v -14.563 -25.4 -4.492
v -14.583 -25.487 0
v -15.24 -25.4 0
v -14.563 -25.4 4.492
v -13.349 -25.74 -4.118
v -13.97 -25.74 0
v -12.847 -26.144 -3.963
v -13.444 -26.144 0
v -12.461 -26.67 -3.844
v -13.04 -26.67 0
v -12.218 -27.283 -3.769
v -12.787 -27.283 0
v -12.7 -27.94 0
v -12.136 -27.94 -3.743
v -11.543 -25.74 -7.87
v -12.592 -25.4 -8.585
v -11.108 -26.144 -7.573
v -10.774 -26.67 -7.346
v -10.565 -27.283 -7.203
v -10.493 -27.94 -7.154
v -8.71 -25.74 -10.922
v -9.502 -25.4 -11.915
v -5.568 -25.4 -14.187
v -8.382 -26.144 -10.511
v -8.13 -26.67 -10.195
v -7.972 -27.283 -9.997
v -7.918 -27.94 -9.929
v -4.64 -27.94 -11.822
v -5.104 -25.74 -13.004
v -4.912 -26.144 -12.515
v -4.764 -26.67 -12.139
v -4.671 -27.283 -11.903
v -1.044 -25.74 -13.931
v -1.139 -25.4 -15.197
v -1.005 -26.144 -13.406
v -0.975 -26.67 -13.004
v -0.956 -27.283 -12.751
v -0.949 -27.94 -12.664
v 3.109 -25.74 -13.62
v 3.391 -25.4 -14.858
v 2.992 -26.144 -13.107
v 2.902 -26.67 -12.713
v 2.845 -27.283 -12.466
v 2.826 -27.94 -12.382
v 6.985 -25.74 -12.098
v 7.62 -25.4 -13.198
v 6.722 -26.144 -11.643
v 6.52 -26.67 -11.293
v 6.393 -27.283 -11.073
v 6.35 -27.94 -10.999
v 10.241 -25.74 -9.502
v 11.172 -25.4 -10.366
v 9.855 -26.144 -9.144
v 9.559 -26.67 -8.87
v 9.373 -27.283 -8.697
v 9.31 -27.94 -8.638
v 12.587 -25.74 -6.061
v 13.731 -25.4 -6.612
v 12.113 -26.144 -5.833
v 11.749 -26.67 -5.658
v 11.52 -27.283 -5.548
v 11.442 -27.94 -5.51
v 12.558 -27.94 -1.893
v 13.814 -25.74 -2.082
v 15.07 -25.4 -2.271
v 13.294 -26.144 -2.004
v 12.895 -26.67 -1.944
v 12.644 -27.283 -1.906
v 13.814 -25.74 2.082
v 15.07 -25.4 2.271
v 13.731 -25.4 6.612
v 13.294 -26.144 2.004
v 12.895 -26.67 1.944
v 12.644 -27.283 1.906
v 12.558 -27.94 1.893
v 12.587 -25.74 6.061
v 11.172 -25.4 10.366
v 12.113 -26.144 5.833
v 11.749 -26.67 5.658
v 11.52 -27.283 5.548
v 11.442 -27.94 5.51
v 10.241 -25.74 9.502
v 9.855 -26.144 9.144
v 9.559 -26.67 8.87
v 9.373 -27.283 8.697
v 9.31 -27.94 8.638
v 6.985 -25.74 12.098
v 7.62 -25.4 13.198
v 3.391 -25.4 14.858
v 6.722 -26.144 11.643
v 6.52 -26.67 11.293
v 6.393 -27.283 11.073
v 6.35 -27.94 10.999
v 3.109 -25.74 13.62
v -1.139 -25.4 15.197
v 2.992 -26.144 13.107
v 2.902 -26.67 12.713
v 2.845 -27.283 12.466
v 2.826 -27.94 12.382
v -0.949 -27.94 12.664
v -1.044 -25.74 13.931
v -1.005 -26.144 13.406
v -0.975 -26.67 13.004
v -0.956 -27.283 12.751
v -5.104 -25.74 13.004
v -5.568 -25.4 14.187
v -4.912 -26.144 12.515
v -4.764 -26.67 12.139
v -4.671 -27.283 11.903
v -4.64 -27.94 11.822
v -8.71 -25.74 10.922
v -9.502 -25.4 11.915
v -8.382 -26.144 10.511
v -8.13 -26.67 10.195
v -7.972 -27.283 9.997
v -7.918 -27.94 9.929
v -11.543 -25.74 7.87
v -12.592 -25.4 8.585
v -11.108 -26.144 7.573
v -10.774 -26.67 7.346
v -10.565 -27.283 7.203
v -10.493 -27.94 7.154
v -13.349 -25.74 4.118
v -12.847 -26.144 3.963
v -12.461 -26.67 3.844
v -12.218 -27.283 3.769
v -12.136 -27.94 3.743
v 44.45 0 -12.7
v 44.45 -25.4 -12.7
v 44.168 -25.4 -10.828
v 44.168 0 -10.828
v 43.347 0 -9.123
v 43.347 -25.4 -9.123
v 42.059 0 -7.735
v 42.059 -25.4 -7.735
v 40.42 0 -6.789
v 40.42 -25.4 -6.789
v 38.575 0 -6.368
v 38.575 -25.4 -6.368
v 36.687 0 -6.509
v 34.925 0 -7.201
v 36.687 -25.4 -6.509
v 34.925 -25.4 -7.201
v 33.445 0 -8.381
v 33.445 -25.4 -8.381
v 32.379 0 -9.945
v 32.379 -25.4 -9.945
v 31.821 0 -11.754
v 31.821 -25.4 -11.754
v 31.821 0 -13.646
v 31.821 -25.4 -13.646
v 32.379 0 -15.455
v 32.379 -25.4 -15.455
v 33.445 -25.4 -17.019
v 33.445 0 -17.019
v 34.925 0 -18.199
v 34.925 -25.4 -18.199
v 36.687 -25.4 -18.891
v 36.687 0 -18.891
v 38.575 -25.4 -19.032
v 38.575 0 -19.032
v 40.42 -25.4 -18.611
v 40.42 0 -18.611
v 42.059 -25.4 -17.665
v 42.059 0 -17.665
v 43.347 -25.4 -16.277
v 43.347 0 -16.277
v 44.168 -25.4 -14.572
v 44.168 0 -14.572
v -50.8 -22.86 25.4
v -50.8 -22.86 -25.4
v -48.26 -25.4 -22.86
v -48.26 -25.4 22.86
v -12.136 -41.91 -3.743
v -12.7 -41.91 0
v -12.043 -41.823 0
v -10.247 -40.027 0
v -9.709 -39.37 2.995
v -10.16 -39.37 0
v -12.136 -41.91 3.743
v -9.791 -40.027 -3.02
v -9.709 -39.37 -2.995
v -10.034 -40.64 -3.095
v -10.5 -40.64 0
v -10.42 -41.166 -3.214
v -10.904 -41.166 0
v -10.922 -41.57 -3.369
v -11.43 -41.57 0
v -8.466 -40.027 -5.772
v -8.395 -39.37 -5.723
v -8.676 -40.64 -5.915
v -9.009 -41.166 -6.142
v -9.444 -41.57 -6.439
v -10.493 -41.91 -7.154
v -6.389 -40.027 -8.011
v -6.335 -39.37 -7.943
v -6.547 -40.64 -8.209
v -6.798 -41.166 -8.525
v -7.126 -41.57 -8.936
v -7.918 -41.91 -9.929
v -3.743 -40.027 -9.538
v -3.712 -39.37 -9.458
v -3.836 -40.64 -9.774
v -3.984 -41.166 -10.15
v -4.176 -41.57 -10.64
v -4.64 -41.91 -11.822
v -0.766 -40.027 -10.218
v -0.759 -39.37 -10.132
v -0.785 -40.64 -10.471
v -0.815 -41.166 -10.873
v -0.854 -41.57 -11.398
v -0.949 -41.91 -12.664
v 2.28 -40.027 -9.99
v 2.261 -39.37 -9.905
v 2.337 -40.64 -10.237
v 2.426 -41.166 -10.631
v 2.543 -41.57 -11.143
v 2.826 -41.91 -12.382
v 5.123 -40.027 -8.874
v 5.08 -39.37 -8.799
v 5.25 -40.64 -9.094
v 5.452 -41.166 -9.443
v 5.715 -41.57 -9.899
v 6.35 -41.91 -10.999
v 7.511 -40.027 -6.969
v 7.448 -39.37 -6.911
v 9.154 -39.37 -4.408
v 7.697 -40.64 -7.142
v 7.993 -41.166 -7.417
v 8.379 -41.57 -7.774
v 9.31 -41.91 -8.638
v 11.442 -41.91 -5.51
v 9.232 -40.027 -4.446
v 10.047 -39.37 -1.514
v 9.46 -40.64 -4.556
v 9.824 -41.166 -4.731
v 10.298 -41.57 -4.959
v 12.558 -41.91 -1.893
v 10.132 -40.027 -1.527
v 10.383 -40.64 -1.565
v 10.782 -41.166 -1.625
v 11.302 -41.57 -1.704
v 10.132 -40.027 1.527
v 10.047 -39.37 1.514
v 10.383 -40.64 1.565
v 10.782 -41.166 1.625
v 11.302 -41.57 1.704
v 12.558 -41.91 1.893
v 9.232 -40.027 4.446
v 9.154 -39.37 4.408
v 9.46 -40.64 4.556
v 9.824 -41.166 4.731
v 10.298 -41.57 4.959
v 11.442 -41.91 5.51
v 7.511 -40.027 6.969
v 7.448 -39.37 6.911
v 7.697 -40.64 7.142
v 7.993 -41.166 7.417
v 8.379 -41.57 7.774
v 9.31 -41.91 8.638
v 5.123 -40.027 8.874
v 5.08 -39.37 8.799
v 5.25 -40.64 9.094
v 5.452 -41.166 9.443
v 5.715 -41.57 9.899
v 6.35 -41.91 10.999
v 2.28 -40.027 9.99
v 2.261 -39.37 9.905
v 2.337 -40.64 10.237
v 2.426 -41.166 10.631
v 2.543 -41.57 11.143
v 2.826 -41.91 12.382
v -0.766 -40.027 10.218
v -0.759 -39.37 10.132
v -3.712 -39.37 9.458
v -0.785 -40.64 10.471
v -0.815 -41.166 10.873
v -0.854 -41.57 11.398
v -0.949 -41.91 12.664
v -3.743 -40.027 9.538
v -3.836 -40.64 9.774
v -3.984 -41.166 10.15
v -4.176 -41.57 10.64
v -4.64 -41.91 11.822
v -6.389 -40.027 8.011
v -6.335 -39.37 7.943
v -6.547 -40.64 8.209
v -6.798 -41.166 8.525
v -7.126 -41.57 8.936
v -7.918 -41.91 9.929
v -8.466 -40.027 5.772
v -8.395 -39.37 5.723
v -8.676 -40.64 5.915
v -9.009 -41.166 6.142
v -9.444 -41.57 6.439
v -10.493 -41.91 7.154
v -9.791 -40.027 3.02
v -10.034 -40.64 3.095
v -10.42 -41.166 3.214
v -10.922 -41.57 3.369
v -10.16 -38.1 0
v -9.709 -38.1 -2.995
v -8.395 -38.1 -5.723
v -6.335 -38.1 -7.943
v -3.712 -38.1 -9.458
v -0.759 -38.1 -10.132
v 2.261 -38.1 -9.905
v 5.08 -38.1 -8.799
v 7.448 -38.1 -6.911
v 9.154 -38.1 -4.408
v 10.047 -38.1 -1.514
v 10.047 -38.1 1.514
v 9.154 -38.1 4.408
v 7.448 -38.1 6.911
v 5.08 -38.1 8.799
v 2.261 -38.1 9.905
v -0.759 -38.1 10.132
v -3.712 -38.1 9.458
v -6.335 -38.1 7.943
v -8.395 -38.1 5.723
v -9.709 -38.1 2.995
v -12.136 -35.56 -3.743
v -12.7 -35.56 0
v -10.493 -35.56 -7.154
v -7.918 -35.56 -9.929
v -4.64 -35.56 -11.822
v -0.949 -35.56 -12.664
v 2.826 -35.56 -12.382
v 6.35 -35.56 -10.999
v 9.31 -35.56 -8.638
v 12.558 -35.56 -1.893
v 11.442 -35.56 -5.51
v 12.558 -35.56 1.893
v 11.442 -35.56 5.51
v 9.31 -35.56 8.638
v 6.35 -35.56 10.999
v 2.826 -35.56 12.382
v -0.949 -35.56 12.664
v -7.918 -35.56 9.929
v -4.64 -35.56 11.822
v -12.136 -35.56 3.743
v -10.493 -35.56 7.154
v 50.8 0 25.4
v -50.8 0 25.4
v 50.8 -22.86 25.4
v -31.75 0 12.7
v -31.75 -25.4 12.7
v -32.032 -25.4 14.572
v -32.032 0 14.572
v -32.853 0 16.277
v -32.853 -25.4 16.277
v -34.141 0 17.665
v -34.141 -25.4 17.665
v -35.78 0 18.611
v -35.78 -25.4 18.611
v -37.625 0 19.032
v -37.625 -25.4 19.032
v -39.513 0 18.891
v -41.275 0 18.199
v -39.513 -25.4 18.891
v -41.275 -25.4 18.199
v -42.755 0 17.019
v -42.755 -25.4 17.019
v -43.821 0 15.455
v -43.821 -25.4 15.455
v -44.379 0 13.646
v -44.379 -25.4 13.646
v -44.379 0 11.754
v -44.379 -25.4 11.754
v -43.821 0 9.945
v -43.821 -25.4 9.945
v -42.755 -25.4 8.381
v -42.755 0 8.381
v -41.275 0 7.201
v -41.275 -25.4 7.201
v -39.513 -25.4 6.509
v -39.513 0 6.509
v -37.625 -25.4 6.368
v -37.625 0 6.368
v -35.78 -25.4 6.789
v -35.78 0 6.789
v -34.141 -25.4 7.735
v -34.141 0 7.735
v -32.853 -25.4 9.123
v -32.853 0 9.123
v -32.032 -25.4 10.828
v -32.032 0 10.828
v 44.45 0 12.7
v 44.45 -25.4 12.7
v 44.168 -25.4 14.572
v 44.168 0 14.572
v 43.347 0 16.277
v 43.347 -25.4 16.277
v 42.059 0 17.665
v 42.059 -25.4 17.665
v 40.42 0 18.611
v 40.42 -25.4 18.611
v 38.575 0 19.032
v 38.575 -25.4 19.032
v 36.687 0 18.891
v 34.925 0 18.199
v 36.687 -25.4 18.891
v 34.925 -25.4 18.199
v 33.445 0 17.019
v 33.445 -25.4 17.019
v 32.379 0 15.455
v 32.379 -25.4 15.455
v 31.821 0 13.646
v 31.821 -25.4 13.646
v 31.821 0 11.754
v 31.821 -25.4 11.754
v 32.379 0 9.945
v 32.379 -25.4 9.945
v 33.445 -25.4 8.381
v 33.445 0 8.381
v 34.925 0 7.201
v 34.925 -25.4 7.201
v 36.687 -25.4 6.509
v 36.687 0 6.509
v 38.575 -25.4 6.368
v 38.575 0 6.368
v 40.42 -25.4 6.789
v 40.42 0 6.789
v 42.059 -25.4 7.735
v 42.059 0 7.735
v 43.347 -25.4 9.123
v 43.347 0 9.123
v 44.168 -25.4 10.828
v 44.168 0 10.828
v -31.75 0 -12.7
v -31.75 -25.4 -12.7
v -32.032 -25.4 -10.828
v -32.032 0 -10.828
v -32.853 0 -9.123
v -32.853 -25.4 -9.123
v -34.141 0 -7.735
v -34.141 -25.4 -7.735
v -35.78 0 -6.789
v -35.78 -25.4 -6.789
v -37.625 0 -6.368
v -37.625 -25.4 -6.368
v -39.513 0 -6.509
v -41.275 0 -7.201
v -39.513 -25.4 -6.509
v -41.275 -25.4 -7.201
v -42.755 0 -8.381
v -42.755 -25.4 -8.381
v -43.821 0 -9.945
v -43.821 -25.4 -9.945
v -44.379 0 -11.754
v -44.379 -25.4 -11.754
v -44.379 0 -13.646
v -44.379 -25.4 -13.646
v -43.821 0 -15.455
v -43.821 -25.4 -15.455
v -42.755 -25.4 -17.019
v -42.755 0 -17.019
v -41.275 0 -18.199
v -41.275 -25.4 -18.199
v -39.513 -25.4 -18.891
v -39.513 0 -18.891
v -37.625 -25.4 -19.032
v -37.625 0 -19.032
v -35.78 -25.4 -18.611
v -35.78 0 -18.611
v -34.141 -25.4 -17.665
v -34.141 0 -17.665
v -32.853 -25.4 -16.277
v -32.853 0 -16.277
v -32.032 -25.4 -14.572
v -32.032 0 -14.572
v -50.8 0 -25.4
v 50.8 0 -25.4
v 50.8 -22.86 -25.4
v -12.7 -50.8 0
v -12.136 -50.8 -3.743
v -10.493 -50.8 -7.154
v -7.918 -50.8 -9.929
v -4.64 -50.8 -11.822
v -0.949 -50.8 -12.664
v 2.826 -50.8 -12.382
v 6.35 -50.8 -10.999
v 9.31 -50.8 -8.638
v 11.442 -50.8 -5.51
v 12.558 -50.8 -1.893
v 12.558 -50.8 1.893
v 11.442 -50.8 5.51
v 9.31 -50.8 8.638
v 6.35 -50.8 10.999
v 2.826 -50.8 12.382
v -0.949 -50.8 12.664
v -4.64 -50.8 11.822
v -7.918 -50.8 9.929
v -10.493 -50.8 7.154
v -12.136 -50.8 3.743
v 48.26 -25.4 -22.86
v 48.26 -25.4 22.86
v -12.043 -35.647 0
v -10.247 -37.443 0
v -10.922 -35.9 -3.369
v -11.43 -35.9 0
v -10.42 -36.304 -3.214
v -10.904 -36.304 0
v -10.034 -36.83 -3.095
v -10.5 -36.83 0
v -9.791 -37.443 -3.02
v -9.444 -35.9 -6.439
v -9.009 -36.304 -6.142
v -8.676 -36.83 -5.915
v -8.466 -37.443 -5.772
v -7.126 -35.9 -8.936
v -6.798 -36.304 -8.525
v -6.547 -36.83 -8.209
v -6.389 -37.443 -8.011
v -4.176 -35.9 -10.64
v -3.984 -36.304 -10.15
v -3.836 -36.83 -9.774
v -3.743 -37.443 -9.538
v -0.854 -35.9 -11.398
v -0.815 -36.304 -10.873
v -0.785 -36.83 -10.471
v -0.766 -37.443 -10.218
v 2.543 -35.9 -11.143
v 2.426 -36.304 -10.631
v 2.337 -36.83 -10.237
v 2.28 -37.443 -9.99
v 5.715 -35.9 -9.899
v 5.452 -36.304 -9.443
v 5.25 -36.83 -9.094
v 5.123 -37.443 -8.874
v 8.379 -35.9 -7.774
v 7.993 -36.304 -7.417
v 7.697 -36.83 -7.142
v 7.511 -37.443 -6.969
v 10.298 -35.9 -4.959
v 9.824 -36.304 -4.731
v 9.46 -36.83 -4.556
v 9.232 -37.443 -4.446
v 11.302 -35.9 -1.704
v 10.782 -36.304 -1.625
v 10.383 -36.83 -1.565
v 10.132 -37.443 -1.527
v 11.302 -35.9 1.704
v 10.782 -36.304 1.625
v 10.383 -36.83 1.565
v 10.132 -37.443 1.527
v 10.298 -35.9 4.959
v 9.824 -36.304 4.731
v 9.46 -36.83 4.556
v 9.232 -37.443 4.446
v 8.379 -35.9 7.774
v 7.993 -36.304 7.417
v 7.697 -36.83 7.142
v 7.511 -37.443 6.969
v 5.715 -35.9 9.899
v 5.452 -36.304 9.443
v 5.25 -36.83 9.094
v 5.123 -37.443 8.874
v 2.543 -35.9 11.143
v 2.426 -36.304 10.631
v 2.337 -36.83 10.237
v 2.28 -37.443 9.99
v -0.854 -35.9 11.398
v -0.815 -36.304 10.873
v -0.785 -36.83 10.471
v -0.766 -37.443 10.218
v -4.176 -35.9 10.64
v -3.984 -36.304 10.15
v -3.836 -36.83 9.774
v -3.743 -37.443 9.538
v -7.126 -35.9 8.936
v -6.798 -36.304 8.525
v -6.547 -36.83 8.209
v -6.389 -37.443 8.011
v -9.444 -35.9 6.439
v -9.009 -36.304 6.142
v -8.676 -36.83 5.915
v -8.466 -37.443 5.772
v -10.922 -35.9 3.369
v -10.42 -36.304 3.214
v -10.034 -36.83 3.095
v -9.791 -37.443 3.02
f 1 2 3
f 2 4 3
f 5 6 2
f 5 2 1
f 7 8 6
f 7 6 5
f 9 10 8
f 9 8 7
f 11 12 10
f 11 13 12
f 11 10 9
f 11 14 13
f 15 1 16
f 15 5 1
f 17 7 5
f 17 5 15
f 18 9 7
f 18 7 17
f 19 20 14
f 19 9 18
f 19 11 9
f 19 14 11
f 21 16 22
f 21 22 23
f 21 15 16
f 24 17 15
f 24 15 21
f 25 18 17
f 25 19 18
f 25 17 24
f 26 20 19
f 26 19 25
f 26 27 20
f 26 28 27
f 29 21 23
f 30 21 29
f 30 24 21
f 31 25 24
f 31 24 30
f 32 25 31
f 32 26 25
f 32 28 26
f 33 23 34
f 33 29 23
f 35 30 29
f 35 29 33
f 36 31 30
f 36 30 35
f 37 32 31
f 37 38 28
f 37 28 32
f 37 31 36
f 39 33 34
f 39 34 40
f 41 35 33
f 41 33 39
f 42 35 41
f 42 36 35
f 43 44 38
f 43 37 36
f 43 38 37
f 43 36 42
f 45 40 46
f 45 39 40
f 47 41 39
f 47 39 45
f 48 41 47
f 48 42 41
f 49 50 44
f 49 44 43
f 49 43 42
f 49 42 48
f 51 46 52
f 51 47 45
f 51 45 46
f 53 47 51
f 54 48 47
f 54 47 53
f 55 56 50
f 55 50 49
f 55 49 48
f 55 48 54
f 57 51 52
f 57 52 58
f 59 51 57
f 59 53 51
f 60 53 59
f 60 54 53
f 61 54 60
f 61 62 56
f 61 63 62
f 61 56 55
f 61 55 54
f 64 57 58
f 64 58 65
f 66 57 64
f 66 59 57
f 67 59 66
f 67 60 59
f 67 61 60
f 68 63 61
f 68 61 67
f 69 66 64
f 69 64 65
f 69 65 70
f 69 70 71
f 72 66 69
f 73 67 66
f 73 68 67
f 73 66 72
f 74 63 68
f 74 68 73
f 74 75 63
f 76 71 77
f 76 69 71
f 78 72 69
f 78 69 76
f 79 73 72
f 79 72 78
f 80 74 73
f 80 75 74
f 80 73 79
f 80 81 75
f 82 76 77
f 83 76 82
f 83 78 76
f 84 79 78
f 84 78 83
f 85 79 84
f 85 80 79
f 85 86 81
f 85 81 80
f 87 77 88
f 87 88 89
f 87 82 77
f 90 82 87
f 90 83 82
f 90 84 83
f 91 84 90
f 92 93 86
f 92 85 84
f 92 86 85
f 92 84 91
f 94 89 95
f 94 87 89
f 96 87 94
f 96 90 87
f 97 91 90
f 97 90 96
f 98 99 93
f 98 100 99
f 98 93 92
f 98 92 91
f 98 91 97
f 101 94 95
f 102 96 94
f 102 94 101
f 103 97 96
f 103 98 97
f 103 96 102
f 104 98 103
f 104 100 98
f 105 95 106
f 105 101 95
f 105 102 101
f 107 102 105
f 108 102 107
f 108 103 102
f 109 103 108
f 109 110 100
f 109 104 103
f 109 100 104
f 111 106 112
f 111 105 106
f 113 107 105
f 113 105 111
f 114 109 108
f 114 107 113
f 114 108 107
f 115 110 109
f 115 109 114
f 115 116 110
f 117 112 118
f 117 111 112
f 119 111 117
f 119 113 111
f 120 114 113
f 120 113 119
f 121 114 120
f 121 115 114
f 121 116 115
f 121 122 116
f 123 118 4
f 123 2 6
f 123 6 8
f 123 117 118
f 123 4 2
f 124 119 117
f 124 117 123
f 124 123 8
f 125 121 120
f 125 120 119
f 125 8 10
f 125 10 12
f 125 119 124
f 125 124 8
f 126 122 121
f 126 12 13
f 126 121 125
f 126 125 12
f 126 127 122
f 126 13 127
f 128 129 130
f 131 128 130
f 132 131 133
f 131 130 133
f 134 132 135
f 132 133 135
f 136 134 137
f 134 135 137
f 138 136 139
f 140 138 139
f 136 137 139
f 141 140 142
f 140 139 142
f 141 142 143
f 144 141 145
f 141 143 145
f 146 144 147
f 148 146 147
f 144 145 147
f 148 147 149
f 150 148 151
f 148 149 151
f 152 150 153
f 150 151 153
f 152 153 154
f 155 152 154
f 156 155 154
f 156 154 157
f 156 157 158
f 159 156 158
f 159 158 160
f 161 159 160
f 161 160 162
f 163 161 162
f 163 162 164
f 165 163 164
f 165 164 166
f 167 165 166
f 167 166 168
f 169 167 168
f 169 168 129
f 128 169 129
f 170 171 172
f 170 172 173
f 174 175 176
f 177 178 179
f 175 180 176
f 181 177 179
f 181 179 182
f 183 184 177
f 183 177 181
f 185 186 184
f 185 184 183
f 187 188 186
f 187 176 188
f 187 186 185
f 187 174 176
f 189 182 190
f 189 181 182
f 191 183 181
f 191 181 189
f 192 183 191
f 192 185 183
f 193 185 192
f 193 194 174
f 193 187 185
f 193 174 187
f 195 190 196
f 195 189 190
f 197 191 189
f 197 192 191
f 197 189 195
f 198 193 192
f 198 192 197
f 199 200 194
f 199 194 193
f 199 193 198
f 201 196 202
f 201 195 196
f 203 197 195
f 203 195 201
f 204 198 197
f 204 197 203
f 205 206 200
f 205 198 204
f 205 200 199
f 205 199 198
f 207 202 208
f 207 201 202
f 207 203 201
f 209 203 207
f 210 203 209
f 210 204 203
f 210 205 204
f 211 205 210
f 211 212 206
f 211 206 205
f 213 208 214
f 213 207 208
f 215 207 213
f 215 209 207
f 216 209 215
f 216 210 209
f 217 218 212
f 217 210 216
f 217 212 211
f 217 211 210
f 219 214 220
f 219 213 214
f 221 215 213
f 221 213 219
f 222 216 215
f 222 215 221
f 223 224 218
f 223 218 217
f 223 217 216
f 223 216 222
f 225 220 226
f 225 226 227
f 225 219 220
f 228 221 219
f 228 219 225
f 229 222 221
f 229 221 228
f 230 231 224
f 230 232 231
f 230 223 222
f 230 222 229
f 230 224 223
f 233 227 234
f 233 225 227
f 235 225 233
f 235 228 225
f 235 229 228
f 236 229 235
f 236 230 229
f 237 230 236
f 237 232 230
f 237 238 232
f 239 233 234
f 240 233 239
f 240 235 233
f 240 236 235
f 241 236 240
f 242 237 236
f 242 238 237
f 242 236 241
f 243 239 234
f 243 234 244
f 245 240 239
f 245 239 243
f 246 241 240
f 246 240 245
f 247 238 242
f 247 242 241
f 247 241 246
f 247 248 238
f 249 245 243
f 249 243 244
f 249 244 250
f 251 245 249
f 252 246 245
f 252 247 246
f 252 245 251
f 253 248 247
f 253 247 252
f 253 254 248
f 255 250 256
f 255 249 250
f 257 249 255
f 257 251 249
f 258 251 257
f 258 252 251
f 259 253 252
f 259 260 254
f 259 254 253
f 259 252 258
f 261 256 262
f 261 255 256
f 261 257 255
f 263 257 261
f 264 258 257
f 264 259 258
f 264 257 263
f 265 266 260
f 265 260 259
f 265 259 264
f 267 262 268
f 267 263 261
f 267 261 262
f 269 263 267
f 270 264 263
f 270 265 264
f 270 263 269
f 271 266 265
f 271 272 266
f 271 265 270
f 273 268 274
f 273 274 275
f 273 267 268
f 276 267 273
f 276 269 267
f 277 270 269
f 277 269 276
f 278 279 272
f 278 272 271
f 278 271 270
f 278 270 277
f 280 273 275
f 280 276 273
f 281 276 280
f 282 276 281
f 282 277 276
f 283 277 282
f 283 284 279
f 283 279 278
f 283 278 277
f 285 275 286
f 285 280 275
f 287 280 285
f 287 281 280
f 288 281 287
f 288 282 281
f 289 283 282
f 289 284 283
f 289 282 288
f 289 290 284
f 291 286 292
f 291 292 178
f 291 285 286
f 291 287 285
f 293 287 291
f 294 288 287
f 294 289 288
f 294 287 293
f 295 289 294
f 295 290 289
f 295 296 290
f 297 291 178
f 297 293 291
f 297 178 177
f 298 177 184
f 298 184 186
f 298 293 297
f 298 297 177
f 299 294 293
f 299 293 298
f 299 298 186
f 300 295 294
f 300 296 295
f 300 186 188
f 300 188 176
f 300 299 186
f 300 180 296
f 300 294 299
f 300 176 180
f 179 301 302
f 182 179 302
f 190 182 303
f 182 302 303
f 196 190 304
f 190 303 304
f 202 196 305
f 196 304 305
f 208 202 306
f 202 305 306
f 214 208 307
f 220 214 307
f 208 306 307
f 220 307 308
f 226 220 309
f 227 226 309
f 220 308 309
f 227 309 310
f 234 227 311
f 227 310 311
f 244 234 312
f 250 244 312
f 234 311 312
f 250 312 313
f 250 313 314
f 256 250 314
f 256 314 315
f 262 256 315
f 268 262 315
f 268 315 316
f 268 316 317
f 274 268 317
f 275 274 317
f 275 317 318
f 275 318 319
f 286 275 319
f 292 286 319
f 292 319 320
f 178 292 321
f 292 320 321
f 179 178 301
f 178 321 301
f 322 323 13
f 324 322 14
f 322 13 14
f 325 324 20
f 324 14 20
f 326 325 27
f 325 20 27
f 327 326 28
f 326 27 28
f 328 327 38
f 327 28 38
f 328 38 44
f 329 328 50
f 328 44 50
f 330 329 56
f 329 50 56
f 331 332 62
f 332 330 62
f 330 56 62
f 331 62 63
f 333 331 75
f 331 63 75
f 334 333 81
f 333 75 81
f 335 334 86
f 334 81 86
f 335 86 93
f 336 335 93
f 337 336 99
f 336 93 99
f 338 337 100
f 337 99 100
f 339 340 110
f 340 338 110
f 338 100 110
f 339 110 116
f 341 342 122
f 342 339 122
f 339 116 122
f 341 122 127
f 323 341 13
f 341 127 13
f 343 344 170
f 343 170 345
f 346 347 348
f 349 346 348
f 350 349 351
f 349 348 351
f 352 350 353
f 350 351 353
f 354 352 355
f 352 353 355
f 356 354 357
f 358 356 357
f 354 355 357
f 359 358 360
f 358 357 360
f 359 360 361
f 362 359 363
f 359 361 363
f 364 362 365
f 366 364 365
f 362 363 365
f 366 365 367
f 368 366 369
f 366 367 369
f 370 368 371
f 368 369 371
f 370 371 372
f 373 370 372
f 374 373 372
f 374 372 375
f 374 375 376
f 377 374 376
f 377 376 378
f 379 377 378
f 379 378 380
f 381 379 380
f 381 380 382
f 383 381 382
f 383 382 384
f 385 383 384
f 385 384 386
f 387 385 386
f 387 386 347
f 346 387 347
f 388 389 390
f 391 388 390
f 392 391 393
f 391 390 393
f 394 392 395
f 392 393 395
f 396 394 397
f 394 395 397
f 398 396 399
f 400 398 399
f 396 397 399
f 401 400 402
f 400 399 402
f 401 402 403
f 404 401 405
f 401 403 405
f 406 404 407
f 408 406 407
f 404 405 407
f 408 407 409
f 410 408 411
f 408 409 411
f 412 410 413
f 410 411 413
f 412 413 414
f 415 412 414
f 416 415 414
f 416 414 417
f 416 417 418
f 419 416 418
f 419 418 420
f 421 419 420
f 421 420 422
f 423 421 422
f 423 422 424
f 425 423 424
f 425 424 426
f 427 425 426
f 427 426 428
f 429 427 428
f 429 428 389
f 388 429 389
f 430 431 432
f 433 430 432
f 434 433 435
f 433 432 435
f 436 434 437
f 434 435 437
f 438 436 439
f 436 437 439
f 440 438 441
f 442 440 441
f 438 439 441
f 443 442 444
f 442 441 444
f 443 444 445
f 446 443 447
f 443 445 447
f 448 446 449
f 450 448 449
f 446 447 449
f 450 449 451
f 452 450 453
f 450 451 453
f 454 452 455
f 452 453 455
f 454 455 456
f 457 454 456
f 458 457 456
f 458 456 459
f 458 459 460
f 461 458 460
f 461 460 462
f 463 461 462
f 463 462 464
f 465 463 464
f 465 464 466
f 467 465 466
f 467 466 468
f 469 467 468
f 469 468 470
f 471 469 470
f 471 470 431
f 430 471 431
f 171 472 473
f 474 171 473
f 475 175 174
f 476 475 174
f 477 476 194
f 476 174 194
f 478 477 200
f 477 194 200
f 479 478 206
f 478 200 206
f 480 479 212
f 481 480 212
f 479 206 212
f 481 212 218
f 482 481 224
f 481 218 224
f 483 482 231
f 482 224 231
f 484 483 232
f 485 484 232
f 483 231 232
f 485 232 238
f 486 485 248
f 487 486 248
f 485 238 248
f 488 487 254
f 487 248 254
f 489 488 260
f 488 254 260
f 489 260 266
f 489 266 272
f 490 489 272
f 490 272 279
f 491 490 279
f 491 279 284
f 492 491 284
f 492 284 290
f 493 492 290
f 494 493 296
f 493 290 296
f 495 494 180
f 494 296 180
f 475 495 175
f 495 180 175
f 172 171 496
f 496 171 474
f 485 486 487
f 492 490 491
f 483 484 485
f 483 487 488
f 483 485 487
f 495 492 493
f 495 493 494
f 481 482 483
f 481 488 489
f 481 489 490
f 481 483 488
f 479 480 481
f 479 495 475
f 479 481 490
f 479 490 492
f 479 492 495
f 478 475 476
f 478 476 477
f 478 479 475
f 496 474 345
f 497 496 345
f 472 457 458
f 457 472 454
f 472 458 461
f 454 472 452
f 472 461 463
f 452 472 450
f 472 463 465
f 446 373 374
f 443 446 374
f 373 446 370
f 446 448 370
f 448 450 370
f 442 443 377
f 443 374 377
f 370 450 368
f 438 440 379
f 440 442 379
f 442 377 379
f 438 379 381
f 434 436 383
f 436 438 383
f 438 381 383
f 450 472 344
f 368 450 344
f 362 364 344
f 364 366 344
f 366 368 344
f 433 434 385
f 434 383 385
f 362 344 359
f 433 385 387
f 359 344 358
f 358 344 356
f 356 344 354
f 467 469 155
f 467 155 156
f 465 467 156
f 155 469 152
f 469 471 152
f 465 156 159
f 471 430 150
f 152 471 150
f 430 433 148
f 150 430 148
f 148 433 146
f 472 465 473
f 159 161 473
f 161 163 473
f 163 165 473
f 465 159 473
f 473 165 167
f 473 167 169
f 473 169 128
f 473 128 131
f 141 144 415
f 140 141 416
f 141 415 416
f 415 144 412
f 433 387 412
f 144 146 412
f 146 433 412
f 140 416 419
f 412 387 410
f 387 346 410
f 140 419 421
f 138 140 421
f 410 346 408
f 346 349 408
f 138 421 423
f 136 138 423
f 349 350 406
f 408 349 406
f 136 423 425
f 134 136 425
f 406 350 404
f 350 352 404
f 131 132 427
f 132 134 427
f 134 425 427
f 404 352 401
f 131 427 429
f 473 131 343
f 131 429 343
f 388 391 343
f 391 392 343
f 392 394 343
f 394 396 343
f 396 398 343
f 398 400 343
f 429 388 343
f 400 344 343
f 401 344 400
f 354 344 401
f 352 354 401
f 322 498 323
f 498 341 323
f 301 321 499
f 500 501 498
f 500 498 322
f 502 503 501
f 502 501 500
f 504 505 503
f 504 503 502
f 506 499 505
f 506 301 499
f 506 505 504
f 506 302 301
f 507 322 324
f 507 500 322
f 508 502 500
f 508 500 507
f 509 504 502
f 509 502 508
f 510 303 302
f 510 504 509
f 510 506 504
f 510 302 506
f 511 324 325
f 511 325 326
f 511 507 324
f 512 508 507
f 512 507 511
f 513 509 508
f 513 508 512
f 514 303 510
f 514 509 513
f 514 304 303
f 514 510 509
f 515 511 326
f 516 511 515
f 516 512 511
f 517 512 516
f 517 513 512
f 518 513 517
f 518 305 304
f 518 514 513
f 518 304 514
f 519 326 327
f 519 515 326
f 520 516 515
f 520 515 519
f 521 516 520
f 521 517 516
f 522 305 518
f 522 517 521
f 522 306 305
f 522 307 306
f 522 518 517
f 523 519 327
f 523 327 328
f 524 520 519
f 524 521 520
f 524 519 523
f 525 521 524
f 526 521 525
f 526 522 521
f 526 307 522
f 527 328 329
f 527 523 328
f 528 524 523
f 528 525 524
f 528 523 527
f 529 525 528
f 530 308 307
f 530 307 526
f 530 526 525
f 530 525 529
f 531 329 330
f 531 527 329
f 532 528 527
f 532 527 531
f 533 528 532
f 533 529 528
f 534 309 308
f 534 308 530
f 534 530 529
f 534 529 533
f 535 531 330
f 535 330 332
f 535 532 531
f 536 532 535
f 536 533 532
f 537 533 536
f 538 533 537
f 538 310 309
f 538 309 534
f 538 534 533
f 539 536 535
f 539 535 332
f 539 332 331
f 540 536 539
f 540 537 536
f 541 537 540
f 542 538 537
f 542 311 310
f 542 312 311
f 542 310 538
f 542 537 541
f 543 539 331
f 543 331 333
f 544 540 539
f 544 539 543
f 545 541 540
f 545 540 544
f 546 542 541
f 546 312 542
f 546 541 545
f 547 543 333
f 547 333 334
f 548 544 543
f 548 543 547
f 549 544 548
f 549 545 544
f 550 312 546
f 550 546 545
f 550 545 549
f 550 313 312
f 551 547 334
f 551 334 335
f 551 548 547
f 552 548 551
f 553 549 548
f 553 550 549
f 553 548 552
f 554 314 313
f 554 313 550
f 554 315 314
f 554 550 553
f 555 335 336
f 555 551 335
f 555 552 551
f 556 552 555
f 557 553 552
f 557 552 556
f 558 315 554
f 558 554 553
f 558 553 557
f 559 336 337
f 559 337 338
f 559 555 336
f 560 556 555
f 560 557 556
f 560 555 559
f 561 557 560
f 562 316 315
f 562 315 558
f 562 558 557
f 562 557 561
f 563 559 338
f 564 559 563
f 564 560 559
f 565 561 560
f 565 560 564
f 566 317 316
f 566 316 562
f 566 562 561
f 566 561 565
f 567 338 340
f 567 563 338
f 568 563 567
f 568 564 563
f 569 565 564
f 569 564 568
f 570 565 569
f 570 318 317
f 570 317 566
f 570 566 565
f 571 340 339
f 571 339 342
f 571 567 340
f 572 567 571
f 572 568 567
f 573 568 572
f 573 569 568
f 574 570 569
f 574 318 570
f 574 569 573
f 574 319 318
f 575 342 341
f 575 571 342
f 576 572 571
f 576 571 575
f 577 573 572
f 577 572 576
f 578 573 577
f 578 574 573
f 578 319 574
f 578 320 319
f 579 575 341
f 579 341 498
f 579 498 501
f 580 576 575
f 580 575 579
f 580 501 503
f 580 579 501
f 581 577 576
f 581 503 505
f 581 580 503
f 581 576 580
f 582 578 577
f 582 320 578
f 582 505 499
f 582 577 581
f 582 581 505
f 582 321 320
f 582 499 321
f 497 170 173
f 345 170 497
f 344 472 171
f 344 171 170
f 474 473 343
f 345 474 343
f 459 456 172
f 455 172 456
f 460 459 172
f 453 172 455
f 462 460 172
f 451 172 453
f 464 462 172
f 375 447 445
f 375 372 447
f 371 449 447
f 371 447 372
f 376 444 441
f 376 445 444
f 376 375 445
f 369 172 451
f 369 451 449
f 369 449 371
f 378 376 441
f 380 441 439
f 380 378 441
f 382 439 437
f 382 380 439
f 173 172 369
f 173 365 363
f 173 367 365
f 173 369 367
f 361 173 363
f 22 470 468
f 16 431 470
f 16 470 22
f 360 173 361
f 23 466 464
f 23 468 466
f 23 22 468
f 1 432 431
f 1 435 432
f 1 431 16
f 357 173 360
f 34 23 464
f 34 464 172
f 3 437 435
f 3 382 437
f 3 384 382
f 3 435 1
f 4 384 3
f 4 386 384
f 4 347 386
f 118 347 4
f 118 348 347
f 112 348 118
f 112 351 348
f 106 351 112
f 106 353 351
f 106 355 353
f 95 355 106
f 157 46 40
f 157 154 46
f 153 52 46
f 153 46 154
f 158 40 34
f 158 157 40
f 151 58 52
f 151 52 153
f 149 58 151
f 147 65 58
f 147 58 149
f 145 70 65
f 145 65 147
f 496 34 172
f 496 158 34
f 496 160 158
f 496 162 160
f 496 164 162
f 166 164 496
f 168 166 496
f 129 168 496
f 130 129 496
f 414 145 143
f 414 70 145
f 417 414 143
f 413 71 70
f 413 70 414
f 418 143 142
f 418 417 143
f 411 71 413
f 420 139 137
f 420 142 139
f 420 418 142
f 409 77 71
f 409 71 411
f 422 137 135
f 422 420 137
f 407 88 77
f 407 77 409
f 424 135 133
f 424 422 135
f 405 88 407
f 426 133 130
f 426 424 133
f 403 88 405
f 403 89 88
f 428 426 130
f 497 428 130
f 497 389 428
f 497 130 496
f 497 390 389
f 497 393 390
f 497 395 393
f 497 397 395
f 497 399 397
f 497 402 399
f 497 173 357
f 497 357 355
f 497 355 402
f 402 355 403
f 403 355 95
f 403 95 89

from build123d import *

# Parameters (mm, degrees)
F0_W     = 101.6
F0_H     = 50.8
F1_DEPTH = 25.4
F2_R     = 6.35
F3_DEPTH = 25.401
F4_W     = 12.7
F4_H     = 25.4
F6_W     = 10.16
F6_H     = 6.35
F8_R     = 2.53999
F9_SIZE  = 2.54


# Not quite as in the source:
# - a fillet or chamfer is up to 0.001 mm smaller than in the source, because OpenCascade refuses the exact size


with BuildPart() as f1:
    # F0 (on Front) → F1 (new body)
    with BuildSketch(Plane.XZ):
        Rectangle(F0_W, F0_H)
    extrude(amount=F1_DEPTH)

    # F2 (on face) → F3 (cut, through all)
    with BuildSketch(Plane.XZ.offset(25.4)):
        with Locations((-38.1, 12.7)):
            Circle(F2_R)
        with Locations((-38.1, -12.7)):
            Circle(F2_R)
        with Locations((38.1, 12.7)):
            Circle(F2_R)
        with Locations((38.1, -12.7)):
            Circle(F2_R)
    extrude(amount=-F3_DEPTH, mode=Mode.SUBTRACT)

    # F4 (on Top) → F5 (revolve)
    with BuildSketch(Plane.XY):
        with Locations((-6.35, -38.1)):
            Rectangle(F4_W, F4_H)
    revolve(axis=Axis((0, -38.1, 0), (0, -1, 0)))

    # F6 (on Top) → F7 (revolve, cut)
    with BuildSketch(Plane.XY):
        with Locations((-15.24, -38.735)):
            Rectangle(F6_W, F6_H)
    revolve(axis=Axis((0, -57.4092715979, 0), (0, -1, 0)), mode=Mode.SUBTRACT)

    # F8 (radius 2.54 in the source; OpenCascade refuses exactly that, so slightly less here)
    f8_edges = [f1.edges().sort_by_distance(p)[0] for p in [
        (12.7, -25.4, 0),
        (10.16, -35.56, 0),
        (10.16, -41.91, 0),
        (-10.16, -38.735, 0),
    ]]
    fillet(f8_edges, radius=F8_R)

    # F9
    f9_edges = [f1.edges().sort_by_distance(p)[0] for p in [
        (-50.8, -25.4, 0),
        (0, -25.4, 25.4),
        (50.8, -25.4, 0),
        (0, -25.4, -25.4),
    ]]
    chamfer(f9_edges, length=F9_SIZE)


solid = f1.part
